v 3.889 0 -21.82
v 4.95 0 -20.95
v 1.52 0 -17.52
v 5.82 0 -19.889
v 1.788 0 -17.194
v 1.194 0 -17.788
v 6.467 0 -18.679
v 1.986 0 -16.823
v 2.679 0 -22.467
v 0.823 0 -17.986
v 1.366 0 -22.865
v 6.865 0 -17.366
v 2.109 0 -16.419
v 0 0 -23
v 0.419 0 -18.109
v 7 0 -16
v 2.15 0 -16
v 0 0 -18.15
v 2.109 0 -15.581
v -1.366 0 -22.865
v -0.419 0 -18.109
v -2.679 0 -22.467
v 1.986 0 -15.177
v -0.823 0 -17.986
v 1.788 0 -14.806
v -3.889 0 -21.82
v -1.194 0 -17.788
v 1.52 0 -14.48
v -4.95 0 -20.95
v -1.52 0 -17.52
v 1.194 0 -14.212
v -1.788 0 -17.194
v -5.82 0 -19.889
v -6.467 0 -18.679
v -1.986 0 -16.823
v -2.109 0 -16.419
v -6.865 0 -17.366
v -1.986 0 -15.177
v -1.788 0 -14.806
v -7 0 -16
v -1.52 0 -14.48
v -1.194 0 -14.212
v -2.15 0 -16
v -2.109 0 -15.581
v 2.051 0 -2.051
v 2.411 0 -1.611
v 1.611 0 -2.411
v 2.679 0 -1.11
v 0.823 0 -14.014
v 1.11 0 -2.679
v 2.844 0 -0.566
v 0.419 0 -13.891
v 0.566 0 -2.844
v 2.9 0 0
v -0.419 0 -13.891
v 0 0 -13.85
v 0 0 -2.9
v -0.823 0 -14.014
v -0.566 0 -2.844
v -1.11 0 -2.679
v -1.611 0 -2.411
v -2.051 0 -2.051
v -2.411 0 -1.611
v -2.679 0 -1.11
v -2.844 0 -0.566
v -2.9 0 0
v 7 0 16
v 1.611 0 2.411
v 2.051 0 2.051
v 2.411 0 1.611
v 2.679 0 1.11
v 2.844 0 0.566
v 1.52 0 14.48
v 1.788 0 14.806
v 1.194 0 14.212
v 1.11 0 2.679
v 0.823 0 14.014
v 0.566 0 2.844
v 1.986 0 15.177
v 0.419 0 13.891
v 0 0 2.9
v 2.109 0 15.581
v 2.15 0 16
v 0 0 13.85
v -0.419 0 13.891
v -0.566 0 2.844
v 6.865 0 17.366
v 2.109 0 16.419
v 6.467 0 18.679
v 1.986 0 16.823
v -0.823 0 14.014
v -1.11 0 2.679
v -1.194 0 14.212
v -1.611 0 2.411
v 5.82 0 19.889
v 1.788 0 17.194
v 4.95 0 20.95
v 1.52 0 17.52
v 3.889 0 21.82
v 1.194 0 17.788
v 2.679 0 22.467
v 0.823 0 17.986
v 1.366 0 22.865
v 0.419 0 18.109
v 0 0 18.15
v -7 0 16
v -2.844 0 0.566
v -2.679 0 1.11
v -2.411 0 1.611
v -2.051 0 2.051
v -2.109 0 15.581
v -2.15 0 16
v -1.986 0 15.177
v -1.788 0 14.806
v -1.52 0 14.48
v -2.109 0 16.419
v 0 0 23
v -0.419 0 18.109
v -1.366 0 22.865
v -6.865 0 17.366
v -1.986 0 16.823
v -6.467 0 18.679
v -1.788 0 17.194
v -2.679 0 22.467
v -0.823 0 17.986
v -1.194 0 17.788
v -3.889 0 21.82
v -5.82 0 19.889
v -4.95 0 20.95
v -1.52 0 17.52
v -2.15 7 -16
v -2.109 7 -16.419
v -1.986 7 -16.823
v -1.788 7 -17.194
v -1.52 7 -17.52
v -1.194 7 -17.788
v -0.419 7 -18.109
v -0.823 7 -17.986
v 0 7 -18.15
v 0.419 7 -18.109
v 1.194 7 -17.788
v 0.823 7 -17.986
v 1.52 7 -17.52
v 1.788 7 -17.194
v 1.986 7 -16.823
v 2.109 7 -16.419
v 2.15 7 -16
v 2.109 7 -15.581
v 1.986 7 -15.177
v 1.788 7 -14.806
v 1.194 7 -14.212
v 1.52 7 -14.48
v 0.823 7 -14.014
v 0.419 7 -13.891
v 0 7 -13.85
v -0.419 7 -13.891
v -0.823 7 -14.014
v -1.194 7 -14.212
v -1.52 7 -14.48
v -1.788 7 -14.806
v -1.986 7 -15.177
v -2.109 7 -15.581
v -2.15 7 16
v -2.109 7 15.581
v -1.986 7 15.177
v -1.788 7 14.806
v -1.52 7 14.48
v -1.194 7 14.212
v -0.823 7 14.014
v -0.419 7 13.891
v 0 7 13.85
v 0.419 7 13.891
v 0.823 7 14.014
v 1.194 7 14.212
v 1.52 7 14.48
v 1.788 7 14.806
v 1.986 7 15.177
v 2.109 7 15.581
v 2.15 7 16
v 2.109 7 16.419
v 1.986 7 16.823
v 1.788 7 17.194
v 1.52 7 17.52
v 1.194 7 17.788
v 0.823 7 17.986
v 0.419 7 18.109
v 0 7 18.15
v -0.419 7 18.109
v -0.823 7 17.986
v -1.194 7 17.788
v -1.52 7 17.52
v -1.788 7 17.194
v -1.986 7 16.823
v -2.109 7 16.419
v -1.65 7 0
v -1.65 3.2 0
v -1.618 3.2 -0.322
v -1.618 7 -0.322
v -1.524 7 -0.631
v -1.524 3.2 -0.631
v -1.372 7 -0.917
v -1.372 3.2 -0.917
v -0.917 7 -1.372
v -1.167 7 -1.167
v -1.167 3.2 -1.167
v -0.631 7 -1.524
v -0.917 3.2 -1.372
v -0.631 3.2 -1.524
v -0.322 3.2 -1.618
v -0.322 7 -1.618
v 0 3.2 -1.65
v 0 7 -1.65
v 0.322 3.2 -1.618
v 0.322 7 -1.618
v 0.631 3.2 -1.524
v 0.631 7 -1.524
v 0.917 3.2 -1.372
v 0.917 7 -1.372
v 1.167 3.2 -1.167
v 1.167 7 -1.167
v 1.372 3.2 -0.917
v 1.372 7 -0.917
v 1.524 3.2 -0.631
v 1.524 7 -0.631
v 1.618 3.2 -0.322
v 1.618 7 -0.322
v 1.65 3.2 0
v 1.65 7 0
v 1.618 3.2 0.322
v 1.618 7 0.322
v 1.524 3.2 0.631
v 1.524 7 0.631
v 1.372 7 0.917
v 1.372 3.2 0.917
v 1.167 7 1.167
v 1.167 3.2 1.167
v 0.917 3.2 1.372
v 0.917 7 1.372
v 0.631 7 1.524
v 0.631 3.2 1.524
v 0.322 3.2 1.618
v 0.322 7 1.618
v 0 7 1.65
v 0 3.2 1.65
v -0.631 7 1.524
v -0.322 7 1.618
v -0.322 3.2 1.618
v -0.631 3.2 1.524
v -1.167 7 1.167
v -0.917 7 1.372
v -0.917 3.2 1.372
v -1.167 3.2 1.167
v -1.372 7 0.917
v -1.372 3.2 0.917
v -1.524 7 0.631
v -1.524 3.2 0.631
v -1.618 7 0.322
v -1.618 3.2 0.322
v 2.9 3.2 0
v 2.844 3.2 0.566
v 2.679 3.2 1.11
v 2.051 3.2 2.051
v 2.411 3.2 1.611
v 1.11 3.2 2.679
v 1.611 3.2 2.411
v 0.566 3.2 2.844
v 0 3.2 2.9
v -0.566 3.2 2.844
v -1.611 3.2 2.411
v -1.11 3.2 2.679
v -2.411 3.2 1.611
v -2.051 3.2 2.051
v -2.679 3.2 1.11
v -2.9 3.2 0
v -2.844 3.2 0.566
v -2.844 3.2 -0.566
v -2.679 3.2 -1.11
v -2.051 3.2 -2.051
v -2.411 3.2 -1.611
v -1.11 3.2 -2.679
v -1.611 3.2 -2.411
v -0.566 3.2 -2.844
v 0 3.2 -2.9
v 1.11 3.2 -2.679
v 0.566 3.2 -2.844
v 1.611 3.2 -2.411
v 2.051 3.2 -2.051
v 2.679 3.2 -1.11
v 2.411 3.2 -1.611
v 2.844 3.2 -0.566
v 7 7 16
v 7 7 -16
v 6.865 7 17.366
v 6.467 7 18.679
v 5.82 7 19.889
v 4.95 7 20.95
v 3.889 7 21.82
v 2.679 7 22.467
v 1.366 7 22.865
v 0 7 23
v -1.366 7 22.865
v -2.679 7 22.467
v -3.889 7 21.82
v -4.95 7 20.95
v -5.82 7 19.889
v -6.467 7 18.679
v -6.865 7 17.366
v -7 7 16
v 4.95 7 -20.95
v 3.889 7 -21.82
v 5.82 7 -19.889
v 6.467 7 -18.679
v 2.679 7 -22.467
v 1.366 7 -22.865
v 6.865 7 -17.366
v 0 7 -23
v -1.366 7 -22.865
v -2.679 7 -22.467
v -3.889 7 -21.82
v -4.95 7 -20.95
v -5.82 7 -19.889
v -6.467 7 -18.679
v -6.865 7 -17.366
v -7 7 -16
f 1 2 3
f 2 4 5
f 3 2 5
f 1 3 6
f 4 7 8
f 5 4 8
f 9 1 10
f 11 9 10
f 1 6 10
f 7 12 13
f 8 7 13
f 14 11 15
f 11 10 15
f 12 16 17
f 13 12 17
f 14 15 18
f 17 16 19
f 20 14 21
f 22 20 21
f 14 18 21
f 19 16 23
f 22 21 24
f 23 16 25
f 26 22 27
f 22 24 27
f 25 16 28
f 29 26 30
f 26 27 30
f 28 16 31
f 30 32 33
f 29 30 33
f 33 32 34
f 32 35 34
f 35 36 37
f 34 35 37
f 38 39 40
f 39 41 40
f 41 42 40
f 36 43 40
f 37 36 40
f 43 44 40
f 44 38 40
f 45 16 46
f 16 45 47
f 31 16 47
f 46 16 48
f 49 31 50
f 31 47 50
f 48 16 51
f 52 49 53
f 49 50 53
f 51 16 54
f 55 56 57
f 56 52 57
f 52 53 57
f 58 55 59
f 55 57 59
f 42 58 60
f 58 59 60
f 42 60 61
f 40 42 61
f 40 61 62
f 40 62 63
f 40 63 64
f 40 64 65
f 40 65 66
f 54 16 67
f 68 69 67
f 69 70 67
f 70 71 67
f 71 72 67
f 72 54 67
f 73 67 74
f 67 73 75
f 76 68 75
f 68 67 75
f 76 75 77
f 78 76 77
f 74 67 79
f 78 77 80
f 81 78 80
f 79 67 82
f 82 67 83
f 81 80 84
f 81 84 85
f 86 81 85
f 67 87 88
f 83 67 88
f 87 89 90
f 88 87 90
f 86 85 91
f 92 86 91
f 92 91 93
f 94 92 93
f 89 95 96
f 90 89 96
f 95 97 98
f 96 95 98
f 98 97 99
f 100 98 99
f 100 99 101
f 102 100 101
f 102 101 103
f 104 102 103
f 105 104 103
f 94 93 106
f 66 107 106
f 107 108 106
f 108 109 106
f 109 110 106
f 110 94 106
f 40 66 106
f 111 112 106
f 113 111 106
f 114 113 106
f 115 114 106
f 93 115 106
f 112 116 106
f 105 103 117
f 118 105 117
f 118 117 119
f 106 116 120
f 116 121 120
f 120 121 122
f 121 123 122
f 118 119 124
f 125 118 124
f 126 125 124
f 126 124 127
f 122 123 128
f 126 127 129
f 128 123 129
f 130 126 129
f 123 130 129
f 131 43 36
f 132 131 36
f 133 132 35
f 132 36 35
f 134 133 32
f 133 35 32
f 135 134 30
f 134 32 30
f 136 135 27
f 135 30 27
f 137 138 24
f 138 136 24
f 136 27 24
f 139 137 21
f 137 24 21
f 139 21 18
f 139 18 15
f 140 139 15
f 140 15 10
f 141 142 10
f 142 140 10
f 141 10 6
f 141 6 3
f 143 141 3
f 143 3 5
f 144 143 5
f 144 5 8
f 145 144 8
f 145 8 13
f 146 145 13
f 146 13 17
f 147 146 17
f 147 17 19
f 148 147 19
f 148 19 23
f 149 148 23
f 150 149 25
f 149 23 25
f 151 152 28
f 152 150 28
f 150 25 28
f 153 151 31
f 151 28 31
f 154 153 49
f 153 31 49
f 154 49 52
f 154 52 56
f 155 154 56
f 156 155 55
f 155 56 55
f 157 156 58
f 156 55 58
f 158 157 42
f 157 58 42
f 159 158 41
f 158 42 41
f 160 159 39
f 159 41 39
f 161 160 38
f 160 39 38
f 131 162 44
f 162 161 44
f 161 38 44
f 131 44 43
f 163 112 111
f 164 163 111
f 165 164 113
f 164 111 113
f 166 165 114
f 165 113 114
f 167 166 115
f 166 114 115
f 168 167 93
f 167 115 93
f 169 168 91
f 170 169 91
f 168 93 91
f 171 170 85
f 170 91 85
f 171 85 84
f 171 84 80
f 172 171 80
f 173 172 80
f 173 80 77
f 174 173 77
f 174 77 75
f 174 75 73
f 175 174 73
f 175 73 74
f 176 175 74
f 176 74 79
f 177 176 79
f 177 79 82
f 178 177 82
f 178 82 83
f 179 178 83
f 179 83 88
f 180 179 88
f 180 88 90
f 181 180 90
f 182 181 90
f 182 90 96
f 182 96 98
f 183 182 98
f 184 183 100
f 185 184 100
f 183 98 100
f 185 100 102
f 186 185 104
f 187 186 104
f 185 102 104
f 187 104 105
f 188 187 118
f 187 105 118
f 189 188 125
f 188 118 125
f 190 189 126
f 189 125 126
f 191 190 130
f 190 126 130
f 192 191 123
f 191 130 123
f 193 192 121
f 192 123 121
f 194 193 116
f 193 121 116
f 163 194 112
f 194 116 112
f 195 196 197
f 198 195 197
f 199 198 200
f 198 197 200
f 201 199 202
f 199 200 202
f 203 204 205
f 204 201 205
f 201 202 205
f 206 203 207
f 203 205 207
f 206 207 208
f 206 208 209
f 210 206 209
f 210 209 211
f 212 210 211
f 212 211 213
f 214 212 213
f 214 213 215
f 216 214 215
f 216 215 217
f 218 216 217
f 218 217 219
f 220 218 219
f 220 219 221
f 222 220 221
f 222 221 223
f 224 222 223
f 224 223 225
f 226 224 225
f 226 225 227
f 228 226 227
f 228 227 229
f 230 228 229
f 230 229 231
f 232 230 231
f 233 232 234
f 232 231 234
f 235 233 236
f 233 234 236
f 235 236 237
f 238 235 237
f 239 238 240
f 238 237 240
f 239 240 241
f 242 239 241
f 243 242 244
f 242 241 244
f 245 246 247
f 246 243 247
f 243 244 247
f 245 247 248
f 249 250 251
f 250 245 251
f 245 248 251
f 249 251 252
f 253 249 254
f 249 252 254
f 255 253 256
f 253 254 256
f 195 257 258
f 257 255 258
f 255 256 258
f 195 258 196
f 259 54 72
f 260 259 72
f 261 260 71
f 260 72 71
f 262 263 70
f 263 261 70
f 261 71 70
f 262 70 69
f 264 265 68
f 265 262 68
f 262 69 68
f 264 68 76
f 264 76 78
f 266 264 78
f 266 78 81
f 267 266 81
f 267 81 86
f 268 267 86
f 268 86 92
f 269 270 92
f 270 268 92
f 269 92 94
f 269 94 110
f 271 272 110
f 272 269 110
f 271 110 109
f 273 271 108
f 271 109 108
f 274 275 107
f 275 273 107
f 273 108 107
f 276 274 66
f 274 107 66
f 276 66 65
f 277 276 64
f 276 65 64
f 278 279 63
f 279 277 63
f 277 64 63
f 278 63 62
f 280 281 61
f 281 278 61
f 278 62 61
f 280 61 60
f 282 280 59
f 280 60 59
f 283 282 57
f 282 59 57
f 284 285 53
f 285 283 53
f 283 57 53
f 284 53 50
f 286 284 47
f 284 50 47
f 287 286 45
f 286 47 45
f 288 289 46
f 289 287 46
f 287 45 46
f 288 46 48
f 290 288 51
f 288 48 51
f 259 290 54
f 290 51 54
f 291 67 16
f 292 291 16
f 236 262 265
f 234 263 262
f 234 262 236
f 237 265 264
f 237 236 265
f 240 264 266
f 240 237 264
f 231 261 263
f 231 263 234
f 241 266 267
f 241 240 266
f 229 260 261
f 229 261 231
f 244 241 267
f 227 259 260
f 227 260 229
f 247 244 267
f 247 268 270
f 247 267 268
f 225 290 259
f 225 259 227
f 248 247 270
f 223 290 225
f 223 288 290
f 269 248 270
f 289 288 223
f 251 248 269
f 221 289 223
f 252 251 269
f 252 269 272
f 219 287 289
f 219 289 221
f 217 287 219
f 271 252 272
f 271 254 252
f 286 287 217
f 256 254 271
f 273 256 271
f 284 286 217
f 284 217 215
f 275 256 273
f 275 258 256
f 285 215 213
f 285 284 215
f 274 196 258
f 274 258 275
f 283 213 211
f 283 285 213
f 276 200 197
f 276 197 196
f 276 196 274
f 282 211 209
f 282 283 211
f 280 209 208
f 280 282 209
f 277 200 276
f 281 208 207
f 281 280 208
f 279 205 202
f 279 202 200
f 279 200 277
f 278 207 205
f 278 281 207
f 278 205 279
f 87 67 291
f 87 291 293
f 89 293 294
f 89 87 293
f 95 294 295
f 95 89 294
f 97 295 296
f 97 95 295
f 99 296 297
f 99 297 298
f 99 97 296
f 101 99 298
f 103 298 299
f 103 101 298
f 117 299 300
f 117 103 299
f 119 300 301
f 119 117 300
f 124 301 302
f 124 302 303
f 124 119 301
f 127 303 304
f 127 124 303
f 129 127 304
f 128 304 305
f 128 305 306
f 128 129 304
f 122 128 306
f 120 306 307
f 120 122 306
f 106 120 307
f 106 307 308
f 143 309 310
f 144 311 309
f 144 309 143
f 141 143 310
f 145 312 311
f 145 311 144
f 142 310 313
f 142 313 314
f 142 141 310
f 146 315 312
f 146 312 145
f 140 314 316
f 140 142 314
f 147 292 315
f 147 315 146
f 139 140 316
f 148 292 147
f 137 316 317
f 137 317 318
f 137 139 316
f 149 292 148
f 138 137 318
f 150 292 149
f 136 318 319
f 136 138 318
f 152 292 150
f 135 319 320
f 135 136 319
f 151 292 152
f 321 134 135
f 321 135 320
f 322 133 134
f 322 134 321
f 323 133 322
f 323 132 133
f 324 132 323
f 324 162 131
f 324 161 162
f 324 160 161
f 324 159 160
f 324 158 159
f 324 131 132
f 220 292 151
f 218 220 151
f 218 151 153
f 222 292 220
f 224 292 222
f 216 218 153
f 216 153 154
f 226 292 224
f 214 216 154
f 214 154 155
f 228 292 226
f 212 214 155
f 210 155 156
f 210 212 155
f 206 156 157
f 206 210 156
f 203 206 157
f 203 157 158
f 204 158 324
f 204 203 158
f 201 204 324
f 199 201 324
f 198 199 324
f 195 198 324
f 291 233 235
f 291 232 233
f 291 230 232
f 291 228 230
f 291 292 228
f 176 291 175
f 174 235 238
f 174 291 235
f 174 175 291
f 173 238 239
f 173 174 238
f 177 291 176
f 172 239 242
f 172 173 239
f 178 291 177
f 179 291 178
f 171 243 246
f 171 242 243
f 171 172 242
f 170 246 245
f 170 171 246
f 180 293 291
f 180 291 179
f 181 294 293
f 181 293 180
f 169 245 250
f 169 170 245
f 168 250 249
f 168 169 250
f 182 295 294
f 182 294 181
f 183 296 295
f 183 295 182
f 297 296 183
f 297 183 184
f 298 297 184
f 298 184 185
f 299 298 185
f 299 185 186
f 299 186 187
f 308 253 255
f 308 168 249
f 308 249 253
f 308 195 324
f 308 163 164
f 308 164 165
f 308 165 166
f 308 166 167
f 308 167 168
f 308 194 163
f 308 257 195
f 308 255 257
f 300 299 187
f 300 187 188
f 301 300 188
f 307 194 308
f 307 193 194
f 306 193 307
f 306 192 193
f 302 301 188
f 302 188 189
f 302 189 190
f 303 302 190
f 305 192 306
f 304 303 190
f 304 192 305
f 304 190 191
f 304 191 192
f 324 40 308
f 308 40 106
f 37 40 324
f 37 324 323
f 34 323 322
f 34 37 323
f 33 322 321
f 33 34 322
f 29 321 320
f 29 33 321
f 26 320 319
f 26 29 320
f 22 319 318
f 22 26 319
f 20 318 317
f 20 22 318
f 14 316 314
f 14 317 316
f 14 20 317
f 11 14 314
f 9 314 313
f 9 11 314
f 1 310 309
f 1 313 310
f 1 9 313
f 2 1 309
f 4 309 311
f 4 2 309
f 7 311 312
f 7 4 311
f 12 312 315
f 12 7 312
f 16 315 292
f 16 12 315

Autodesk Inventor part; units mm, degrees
ref_plane "YZ Plane" through (0, 0, 0) normal (1, 0, 0) x (0, 1, 0)
ref_plane "XZ Plane" through (0, 0, 0) normal (0, 1, 0) x (-1, 0, 0)
ref_plane "XY Plane" through (0, 0, 0) normal (0, 0, 1) x (1, 0, 0)
sketch "Sketch1" plane through (0, 0, 0) normal (0, 1, 0) x (-1, 0, 0)
  circle A0 centre (0, 0) radius 1.65
  line L0 (0, 0) -> (0, -16) construction
  line L1 (-7, 0) -> (-7, -16)
  line L2 (7, -16) -> (7, 0)
  arc A1 (7, 0) -> (-7, 0) centre (0, 0) ccw
  arc A2 (-7, -16) -> (7, -16) centre (0, -16) ccw
  circle A3 centre (0, -16) radius 2.15
  point P0 (0, -8)
  dimension "d0" = 3.3
  dimension "d1" = 16
  dimension "d2" = 14
  dimension "d3" = 4.3
extrude "Extrusion1" add sketch "Sketch1" along normal blind 7
sketch "Sketch2" plane through (0, 0, 0) normal (0, -1, 0) x (1, 0, 0)
  circle A0 centre (0, 0) radius 1.65 projected
  circle A1 centre (0, 0) radius 2.9
  dimension "d6" = 5.8
extrude "Extrusion2" cut sketch "Sketch2" against normal blind 3.2
mirror "Mirror1" about plane through (0, 0, 0) normal (0, 0, 1) of "Extrusion1", "Extrusion2"
ref_plane "Work Plane1" through (0, 0, 0) normal (0, 0, 1) x (1, 0, 0)
properties part number "futek-holder"
